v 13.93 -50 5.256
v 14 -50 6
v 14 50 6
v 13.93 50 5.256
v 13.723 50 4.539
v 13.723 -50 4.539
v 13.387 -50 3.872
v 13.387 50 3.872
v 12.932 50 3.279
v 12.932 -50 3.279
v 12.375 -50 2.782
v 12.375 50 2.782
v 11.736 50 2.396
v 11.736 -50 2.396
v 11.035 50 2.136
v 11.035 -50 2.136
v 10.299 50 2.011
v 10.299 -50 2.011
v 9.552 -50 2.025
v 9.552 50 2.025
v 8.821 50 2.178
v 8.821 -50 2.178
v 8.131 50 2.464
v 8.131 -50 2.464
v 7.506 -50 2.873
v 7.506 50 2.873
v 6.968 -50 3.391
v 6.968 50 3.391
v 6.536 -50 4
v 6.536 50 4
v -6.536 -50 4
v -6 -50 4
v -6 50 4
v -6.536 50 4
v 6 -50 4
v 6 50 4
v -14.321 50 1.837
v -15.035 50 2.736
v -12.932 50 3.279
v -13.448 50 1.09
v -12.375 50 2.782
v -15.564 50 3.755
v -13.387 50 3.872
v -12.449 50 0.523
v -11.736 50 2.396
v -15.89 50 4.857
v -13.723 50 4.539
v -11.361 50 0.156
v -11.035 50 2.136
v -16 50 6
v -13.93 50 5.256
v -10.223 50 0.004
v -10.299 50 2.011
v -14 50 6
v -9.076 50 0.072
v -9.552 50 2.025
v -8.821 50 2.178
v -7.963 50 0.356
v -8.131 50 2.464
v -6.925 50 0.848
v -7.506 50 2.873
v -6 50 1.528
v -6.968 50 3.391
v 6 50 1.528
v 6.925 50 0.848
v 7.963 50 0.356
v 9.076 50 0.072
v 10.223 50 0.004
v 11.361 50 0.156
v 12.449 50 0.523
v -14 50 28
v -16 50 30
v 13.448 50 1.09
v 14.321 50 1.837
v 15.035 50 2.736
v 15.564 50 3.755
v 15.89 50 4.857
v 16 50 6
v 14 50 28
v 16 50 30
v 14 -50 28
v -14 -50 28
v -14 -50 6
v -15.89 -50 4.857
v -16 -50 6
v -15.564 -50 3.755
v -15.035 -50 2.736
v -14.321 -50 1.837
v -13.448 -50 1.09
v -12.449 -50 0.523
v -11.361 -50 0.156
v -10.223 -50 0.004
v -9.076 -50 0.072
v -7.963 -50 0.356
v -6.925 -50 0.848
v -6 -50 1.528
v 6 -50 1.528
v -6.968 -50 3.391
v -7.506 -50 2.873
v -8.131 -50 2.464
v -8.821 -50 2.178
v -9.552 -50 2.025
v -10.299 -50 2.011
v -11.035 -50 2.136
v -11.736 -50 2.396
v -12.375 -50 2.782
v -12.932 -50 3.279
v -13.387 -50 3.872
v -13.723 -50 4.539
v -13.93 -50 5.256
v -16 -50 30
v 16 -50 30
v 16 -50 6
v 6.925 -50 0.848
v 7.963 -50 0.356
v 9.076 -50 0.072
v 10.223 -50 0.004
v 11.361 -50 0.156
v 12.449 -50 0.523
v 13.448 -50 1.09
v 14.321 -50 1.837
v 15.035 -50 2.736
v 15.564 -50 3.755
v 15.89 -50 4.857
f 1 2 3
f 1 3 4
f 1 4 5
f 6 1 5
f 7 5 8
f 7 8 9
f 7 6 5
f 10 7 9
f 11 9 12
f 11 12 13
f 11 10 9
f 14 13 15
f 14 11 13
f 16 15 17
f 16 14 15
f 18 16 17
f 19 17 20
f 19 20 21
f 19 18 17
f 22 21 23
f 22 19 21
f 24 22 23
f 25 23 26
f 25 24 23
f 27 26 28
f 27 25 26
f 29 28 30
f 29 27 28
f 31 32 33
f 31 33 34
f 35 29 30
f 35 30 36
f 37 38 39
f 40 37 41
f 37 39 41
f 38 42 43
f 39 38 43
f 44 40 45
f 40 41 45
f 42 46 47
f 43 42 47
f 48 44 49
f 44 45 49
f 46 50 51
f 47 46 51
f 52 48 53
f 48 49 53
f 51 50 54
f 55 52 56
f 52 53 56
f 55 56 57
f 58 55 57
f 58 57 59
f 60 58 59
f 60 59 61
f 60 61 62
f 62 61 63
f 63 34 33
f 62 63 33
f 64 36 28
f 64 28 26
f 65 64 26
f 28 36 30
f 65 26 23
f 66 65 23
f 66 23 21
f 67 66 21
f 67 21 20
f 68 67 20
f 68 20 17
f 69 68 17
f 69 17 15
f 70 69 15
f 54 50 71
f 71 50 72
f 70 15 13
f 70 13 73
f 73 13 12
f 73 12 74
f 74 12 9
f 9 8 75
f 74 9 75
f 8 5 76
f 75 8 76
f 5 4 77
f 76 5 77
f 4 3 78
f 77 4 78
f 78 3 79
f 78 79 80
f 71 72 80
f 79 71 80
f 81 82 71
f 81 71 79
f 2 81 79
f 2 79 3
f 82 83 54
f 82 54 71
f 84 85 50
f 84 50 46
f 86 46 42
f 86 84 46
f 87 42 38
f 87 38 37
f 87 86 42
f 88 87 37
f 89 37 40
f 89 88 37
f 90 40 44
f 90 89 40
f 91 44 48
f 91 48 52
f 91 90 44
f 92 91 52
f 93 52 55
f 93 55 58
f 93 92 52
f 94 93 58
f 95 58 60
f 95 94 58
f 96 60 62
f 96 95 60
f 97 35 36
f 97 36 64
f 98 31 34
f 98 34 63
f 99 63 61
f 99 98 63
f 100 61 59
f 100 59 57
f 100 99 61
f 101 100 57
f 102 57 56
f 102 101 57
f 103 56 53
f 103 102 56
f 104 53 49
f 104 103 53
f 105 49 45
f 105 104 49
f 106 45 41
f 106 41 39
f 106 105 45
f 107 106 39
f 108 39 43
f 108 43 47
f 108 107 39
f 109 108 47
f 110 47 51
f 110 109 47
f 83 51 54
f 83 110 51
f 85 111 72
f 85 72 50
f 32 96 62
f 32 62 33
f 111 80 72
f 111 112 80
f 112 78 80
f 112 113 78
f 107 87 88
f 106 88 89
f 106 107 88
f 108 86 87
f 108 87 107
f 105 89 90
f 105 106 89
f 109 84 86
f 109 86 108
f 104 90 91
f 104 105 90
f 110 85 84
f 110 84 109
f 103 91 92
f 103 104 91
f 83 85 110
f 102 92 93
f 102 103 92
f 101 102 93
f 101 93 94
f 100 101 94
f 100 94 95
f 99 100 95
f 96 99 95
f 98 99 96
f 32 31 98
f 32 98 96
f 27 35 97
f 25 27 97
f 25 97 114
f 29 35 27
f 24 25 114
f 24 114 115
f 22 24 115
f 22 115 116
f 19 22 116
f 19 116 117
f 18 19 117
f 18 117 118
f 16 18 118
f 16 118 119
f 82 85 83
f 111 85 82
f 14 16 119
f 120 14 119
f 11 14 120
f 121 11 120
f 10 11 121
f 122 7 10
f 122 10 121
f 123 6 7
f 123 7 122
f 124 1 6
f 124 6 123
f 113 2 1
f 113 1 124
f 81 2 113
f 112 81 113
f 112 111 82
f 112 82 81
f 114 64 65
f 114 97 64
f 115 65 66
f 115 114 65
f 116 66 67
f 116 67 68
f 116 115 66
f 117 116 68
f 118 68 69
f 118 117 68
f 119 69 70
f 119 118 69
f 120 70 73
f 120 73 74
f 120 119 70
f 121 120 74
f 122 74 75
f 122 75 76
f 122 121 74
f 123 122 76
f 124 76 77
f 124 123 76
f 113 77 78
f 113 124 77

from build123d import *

# Parameters (mm, degrees)
F1_DEPTH = 50


with BuildPart() as f1:
    # F0 (on Front) → F1 (new body, symmetric)
    with BuildSketch(Plane.XZ):
        with BuildLine():
            Line((16, 30), (-16, 30))
            Line((-16, 30), (-16, 6))
            ThreePointArc((-16, 6), (-12.4494897428, 0.5227744249), (-6, 1.527864045))
            Line((-6, 1.527864045), (-6, 4))
            Line((-6, 4), (-6.5358986055, 4))
            ThreePointArc((-6.5358986055, 4), (-11.0352761842, 2.1362968937), (-13.9999998089, 6))
            Line((-13.9999998089, 6), (-13.9999998089, 27.9999998089))
            Line((-13.9999998089, 27.9999998089), (13.9999998089, 27.9999998089))
            Line((13.9999998089, 27.9999998089), (13.9999998089, 6))
            ThreePointArc((13.9999998089, 6), (11.0352761842, 2.1362968937), (6.5358986055, 4))
            Line((6.5358986055, 4), (6, 4))
            Line((6, 4), (6, 1.527864045))
            ThreePointArc((6, 1.527864045), (12.4494897428, 0.5227744249), (16, 6))
            Line((16, 6), (16, 30))
        make_face()
    extrude(amount=F1_DEPTH, both=True)


solid = f1.part
